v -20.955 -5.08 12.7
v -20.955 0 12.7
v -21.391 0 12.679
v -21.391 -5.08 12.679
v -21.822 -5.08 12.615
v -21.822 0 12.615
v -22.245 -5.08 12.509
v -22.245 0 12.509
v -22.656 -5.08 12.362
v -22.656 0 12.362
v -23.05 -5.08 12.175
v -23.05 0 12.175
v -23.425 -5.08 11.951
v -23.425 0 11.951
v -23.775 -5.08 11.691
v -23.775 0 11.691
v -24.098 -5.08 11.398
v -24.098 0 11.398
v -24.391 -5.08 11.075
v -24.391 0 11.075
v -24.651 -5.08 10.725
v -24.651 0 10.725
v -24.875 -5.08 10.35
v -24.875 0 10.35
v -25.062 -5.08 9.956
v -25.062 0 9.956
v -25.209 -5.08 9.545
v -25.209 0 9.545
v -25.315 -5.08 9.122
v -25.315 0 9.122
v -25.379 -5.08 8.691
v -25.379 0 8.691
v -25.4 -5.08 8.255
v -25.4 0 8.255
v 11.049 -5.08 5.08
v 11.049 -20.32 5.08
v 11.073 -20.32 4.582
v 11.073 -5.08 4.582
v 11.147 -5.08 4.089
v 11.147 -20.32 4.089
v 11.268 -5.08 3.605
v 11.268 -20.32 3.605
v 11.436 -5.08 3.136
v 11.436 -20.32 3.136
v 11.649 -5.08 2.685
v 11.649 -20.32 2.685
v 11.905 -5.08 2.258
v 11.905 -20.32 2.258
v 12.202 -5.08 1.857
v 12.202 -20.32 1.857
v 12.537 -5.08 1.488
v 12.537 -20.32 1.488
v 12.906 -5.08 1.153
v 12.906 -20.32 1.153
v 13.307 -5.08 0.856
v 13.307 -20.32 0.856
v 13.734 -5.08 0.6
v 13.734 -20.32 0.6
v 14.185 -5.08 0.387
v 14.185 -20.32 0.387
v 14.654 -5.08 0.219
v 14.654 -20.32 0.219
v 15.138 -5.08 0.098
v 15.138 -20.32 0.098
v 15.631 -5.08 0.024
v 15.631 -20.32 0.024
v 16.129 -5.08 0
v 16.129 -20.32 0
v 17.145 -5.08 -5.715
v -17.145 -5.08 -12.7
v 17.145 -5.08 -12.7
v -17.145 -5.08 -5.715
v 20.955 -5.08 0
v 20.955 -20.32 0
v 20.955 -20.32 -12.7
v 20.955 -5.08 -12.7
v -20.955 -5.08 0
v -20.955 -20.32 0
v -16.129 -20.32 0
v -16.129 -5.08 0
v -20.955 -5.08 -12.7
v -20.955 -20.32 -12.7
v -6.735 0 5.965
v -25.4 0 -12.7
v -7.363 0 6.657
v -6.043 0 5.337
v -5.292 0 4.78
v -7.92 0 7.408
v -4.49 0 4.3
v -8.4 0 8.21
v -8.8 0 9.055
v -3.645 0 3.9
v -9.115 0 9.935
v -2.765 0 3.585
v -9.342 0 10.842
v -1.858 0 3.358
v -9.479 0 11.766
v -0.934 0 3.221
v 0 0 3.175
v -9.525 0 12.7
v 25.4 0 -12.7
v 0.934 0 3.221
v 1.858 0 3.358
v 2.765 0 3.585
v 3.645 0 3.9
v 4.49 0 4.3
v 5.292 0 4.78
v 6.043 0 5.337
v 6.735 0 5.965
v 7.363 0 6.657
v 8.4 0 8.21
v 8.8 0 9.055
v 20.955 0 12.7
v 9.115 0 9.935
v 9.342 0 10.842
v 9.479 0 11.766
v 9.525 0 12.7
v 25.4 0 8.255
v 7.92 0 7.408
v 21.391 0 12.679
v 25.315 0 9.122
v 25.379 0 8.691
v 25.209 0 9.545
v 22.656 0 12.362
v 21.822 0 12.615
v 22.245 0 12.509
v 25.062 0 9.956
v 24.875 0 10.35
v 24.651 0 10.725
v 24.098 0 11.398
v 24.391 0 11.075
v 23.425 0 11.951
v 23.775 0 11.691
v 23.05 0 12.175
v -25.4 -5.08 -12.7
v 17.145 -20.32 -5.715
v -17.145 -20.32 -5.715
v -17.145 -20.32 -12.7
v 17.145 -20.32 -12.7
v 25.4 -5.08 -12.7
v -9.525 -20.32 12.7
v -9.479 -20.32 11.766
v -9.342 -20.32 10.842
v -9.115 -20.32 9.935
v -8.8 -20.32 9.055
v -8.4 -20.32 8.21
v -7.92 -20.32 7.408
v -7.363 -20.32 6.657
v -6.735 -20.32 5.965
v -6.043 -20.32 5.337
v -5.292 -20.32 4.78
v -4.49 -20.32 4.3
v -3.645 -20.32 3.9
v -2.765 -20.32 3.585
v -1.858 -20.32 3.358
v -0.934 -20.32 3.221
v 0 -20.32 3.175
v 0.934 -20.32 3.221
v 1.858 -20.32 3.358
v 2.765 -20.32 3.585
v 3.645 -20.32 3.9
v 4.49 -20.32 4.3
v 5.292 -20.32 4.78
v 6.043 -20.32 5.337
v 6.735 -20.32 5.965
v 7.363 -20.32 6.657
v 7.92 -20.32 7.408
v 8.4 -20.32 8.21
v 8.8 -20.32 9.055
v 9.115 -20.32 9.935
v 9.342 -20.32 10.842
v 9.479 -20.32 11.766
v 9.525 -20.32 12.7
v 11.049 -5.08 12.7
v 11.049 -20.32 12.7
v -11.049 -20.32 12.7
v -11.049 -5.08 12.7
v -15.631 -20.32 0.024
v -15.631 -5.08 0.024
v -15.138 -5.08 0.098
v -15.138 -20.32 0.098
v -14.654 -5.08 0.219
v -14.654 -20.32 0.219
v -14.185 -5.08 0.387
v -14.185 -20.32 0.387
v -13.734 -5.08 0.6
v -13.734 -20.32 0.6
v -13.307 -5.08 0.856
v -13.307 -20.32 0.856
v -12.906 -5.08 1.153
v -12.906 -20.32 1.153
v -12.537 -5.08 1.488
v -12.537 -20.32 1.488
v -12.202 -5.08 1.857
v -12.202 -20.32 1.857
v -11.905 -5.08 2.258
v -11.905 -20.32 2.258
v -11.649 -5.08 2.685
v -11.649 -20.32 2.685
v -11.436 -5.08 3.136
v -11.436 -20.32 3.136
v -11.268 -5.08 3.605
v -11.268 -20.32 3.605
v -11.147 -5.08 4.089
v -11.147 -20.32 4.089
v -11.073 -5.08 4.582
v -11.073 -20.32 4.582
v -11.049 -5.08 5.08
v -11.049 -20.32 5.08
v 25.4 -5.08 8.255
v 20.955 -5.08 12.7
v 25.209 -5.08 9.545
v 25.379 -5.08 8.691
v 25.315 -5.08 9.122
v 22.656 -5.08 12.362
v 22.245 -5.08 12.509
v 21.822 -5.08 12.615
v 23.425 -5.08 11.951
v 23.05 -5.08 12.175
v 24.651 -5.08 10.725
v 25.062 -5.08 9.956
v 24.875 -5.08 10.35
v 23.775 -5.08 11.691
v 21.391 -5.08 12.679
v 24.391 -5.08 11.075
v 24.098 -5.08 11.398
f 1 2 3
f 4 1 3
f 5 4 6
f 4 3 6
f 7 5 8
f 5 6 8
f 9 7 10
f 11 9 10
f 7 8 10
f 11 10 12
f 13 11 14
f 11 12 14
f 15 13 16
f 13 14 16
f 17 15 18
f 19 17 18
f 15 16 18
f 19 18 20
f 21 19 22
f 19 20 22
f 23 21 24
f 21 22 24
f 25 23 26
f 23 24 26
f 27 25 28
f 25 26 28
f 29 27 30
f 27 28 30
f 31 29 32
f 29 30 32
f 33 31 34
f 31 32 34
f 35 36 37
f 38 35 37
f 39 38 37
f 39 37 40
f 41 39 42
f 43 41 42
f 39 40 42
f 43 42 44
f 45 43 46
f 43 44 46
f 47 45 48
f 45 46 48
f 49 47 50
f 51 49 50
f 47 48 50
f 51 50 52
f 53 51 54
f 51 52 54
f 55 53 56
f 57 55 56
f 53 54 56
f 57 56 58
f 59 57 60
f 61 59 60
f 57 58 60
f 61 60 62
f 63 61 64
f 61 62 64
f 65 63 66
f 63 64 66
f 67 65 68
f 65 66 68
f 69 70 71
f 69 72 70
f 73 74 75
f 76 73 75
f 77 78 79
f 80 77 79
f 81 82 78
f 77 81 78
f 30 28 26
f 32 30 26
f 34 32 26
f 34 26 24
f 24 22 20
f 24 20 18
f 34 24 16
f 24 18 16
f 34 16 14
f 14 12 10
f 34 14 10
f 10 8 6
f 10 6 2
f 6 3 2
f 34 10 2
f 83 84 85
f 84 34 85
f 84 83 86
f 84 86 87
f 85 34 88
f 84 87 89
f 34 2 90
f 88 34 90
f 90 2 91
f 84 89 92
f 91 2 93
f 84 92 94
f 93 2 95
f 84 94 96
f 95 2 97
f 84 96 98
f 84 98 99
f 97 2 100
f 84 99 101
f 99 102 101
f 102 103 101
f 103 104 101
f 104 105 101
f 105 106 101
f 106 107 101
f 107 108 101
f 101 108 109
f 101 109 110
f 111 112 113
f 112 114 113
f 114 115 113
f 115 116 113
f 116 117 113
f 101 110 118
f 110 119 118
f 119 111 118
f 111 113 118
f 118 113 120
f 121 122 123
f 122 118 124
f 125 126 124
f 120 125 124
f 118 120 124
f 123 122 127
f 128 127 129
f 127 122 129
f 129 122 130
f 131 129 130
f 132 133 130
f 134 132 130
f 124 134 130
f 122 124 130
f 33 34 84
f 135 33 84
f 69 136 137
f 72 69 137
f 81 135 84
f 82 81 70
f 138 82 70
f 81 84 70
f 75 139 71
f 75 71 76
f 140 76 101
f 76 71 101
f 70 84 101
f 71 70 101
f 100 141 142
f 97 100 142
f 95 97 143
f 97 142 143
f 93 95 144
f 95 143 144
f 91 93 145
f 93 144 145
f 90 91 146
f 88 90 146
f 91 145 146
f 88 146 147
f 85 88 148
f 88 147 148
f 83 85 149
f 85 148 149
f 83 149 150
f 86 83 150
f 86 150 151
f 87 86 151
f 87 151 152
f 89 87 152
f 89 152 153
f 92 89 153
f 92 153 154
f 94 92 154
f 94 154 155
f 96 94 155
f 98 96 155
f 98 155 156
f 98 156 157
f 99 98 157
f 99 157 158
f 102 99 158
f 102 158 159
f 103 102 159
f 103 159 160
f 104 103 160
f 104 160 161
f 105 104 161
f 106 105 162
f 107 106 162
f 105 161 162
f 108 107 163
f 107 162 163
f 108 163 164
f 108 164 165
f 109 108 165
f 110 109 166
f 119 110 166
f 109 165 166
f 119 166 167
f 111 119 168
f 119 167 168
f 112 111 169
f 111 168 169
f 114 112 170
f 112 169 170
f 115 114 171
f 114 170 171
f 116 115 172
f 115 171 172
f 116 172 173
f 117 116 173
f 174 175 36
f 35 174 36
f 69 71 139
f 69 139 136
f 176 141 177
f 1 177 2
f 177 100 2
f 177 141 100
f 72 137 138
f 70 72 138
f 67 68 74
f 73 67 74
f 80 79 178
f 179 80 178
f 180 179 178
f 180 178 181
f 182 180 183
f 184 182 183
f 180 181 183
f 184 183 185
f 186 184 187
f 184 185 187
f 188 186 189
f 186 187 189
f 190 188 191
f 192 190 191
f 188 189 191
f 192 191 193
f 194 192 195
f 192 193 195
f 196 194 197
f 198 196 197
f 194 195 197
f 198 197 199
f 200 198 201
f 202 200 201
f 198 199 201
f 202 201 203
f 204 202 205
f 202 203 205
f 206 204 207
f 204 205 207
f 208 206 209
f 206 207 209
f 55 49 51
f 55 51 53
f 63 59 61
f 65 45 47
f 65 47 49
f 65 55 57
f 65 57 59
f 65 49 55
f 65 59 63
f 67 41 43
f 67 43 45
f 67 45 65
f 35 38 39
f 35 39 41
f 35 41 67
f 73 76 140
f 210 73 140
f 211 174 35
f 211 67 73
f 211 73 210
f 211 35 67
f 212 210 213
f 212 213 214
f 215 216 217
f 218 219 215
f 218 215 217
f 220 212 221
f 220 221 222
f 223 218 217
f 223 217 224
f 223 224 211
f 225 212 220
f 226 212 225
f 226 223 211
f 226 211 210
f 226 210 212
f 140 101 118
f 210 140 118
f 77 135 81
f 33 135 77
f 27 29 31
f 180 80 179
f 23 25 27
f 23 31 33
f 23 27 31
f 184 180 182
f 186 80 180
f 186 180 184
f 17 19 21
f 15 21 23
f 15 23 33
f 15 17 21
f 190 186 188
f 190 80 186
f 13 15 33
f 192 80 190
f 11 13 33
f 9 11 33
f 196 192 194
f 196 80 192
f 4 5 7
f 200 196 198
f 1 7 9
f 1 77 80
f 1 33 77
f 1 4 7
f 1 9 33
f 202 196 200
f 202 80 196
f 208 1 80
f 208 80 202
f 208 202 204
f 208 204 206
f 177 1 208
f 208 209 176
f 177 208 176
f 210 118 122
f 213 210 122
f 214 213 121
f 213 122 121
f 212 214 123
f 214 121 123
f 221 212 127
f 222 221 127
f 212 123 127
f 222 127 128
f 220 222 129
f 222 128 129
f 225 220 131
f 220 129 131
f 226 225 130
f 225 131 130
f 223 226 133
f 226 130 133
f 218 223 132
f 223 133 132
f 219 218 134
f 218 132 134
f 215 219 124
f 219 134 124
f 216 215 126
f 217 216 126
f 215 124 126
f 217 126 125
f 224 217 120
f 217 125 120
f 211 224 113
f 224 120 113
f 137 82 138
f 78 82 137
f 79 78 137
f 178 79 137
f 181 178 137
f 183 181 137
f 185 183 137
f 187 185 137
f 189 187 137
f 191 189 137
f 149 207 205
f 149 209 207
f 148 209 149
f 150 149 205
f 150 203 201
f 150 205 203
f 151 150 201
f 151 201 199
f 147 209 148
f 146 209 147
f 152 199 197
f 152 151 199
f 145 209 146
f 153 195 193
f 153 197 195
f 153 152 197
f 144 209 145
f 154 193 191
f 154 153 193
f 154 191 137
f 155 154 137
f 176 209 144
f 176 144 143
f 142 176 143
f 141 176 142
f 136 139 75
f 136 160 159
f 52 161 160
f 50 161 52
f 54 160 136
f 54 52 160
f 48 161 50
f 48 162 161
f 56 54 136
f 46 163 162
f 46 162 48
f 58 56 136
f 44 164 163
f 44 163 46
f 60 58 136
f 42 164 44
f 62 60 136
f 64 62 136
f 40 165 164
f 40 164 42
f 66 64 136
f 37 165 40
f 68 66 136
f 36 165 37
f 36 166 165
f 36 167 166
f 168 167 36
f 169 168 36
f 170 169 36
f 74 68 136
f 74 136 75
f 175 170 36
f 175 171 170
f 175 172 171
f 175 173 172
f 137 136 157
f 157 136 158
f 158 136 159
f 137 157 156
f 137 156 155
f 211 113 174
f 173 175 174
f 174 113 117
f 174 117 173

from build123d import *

# Parameters (mm, degrees)
F1_DEPTH = 20.32
F3_DEPTH = 20.321
F5_DEPTH = 15.24


with BuildPart() as f1:
    # F0 (on Front) → F1 (new body)
    with BuildSketch(Plane.XZ):
        with BuildLine():
            Line((-25.4, 8.255), (-25.4, -12.7))
            Line((-25.4, -12.7), (25.4, -12.7))
            Line((25.4, -12.7), (25.4, 8.255))
            ThreePointArc((25.4, 8.255), (24.09809, 11.39809), (20.955, 12.7))
            Line((20.955, 12.7), (-20.955, 12.7))
            ThreePointArc((-20.955, 12.7), (-24.09809, 11.39809), (-25.4, 8.255))
        make_face()
    extrude(amount=F1_DEPTH)

    # F2 (on face) → F3 (cut, through all)
    with BuildSketch(Plane.XZ.offset(20.32)):
        with BuildLine():
            Line((9.525, 12.7), (-9.525, 12.7))
            ThreePointArc((-9.525, 12.7), (0, 3.175), (9.525, 12.7))
        make_face()
    extrude(amount=-F3_DEPTH, mode=Mode.SUBTRACT)

    # F4 (on face) → F5 (cut)
    with BuildSketch(Plane.XZ.offset(20.32)):
        with BuildLine():
            Line((-11.049, 5.08), (-11.049, 12.7))
            Line((-11.049, 12.7), (-20.955, 12.7))
            ThreePointArc((-20.955, 12.7), (-24.09809, 11.39809), (-25.4, 8.255))
            Line((-25.4, 8.255), (-25.4, -12.7))
            Line((-25.4, -12.7), (-20.955, -12.7))
            Line((-20.955, -12.7), (-20.955, 0))
            Line((-20.955, 0), (-16.129, 0))
            ThreePointArc((-16.129, 0), (-12.536898, 1.487898), (-11.049, 5.08))
        make_face()
        Polygon((-17.145, -12.7), (17.145, -12.7), (17.145, -5.715), (0, -5.715), (-17.145, -5.715), align=None)
        with BuildLine():
            Line((20.955, 12.7), (11.049, 12.7))
            Line((11.049, 12.7), (11.049, 5.08))
            ThreePointArc((11.049, 5.08), (12.536898, 1.487898), (16.129, 0))
            Line((16.129, 0), (20.955, 0))
            Line((20.955, 0), (20.955, -12.7))
            Line((20.955, -12.7), (25.4, -12.7))
            Line((25.4, -12.7), (25.4, 8.255))
            ThreePointArc((25.4, 8.255), (24.09809, 11.39809), (20.955, 12.7))
        make_face()
    extrude(amount=-F5_DEPTH, mode=Mode.SUBTRACT)


solid = f1.part
